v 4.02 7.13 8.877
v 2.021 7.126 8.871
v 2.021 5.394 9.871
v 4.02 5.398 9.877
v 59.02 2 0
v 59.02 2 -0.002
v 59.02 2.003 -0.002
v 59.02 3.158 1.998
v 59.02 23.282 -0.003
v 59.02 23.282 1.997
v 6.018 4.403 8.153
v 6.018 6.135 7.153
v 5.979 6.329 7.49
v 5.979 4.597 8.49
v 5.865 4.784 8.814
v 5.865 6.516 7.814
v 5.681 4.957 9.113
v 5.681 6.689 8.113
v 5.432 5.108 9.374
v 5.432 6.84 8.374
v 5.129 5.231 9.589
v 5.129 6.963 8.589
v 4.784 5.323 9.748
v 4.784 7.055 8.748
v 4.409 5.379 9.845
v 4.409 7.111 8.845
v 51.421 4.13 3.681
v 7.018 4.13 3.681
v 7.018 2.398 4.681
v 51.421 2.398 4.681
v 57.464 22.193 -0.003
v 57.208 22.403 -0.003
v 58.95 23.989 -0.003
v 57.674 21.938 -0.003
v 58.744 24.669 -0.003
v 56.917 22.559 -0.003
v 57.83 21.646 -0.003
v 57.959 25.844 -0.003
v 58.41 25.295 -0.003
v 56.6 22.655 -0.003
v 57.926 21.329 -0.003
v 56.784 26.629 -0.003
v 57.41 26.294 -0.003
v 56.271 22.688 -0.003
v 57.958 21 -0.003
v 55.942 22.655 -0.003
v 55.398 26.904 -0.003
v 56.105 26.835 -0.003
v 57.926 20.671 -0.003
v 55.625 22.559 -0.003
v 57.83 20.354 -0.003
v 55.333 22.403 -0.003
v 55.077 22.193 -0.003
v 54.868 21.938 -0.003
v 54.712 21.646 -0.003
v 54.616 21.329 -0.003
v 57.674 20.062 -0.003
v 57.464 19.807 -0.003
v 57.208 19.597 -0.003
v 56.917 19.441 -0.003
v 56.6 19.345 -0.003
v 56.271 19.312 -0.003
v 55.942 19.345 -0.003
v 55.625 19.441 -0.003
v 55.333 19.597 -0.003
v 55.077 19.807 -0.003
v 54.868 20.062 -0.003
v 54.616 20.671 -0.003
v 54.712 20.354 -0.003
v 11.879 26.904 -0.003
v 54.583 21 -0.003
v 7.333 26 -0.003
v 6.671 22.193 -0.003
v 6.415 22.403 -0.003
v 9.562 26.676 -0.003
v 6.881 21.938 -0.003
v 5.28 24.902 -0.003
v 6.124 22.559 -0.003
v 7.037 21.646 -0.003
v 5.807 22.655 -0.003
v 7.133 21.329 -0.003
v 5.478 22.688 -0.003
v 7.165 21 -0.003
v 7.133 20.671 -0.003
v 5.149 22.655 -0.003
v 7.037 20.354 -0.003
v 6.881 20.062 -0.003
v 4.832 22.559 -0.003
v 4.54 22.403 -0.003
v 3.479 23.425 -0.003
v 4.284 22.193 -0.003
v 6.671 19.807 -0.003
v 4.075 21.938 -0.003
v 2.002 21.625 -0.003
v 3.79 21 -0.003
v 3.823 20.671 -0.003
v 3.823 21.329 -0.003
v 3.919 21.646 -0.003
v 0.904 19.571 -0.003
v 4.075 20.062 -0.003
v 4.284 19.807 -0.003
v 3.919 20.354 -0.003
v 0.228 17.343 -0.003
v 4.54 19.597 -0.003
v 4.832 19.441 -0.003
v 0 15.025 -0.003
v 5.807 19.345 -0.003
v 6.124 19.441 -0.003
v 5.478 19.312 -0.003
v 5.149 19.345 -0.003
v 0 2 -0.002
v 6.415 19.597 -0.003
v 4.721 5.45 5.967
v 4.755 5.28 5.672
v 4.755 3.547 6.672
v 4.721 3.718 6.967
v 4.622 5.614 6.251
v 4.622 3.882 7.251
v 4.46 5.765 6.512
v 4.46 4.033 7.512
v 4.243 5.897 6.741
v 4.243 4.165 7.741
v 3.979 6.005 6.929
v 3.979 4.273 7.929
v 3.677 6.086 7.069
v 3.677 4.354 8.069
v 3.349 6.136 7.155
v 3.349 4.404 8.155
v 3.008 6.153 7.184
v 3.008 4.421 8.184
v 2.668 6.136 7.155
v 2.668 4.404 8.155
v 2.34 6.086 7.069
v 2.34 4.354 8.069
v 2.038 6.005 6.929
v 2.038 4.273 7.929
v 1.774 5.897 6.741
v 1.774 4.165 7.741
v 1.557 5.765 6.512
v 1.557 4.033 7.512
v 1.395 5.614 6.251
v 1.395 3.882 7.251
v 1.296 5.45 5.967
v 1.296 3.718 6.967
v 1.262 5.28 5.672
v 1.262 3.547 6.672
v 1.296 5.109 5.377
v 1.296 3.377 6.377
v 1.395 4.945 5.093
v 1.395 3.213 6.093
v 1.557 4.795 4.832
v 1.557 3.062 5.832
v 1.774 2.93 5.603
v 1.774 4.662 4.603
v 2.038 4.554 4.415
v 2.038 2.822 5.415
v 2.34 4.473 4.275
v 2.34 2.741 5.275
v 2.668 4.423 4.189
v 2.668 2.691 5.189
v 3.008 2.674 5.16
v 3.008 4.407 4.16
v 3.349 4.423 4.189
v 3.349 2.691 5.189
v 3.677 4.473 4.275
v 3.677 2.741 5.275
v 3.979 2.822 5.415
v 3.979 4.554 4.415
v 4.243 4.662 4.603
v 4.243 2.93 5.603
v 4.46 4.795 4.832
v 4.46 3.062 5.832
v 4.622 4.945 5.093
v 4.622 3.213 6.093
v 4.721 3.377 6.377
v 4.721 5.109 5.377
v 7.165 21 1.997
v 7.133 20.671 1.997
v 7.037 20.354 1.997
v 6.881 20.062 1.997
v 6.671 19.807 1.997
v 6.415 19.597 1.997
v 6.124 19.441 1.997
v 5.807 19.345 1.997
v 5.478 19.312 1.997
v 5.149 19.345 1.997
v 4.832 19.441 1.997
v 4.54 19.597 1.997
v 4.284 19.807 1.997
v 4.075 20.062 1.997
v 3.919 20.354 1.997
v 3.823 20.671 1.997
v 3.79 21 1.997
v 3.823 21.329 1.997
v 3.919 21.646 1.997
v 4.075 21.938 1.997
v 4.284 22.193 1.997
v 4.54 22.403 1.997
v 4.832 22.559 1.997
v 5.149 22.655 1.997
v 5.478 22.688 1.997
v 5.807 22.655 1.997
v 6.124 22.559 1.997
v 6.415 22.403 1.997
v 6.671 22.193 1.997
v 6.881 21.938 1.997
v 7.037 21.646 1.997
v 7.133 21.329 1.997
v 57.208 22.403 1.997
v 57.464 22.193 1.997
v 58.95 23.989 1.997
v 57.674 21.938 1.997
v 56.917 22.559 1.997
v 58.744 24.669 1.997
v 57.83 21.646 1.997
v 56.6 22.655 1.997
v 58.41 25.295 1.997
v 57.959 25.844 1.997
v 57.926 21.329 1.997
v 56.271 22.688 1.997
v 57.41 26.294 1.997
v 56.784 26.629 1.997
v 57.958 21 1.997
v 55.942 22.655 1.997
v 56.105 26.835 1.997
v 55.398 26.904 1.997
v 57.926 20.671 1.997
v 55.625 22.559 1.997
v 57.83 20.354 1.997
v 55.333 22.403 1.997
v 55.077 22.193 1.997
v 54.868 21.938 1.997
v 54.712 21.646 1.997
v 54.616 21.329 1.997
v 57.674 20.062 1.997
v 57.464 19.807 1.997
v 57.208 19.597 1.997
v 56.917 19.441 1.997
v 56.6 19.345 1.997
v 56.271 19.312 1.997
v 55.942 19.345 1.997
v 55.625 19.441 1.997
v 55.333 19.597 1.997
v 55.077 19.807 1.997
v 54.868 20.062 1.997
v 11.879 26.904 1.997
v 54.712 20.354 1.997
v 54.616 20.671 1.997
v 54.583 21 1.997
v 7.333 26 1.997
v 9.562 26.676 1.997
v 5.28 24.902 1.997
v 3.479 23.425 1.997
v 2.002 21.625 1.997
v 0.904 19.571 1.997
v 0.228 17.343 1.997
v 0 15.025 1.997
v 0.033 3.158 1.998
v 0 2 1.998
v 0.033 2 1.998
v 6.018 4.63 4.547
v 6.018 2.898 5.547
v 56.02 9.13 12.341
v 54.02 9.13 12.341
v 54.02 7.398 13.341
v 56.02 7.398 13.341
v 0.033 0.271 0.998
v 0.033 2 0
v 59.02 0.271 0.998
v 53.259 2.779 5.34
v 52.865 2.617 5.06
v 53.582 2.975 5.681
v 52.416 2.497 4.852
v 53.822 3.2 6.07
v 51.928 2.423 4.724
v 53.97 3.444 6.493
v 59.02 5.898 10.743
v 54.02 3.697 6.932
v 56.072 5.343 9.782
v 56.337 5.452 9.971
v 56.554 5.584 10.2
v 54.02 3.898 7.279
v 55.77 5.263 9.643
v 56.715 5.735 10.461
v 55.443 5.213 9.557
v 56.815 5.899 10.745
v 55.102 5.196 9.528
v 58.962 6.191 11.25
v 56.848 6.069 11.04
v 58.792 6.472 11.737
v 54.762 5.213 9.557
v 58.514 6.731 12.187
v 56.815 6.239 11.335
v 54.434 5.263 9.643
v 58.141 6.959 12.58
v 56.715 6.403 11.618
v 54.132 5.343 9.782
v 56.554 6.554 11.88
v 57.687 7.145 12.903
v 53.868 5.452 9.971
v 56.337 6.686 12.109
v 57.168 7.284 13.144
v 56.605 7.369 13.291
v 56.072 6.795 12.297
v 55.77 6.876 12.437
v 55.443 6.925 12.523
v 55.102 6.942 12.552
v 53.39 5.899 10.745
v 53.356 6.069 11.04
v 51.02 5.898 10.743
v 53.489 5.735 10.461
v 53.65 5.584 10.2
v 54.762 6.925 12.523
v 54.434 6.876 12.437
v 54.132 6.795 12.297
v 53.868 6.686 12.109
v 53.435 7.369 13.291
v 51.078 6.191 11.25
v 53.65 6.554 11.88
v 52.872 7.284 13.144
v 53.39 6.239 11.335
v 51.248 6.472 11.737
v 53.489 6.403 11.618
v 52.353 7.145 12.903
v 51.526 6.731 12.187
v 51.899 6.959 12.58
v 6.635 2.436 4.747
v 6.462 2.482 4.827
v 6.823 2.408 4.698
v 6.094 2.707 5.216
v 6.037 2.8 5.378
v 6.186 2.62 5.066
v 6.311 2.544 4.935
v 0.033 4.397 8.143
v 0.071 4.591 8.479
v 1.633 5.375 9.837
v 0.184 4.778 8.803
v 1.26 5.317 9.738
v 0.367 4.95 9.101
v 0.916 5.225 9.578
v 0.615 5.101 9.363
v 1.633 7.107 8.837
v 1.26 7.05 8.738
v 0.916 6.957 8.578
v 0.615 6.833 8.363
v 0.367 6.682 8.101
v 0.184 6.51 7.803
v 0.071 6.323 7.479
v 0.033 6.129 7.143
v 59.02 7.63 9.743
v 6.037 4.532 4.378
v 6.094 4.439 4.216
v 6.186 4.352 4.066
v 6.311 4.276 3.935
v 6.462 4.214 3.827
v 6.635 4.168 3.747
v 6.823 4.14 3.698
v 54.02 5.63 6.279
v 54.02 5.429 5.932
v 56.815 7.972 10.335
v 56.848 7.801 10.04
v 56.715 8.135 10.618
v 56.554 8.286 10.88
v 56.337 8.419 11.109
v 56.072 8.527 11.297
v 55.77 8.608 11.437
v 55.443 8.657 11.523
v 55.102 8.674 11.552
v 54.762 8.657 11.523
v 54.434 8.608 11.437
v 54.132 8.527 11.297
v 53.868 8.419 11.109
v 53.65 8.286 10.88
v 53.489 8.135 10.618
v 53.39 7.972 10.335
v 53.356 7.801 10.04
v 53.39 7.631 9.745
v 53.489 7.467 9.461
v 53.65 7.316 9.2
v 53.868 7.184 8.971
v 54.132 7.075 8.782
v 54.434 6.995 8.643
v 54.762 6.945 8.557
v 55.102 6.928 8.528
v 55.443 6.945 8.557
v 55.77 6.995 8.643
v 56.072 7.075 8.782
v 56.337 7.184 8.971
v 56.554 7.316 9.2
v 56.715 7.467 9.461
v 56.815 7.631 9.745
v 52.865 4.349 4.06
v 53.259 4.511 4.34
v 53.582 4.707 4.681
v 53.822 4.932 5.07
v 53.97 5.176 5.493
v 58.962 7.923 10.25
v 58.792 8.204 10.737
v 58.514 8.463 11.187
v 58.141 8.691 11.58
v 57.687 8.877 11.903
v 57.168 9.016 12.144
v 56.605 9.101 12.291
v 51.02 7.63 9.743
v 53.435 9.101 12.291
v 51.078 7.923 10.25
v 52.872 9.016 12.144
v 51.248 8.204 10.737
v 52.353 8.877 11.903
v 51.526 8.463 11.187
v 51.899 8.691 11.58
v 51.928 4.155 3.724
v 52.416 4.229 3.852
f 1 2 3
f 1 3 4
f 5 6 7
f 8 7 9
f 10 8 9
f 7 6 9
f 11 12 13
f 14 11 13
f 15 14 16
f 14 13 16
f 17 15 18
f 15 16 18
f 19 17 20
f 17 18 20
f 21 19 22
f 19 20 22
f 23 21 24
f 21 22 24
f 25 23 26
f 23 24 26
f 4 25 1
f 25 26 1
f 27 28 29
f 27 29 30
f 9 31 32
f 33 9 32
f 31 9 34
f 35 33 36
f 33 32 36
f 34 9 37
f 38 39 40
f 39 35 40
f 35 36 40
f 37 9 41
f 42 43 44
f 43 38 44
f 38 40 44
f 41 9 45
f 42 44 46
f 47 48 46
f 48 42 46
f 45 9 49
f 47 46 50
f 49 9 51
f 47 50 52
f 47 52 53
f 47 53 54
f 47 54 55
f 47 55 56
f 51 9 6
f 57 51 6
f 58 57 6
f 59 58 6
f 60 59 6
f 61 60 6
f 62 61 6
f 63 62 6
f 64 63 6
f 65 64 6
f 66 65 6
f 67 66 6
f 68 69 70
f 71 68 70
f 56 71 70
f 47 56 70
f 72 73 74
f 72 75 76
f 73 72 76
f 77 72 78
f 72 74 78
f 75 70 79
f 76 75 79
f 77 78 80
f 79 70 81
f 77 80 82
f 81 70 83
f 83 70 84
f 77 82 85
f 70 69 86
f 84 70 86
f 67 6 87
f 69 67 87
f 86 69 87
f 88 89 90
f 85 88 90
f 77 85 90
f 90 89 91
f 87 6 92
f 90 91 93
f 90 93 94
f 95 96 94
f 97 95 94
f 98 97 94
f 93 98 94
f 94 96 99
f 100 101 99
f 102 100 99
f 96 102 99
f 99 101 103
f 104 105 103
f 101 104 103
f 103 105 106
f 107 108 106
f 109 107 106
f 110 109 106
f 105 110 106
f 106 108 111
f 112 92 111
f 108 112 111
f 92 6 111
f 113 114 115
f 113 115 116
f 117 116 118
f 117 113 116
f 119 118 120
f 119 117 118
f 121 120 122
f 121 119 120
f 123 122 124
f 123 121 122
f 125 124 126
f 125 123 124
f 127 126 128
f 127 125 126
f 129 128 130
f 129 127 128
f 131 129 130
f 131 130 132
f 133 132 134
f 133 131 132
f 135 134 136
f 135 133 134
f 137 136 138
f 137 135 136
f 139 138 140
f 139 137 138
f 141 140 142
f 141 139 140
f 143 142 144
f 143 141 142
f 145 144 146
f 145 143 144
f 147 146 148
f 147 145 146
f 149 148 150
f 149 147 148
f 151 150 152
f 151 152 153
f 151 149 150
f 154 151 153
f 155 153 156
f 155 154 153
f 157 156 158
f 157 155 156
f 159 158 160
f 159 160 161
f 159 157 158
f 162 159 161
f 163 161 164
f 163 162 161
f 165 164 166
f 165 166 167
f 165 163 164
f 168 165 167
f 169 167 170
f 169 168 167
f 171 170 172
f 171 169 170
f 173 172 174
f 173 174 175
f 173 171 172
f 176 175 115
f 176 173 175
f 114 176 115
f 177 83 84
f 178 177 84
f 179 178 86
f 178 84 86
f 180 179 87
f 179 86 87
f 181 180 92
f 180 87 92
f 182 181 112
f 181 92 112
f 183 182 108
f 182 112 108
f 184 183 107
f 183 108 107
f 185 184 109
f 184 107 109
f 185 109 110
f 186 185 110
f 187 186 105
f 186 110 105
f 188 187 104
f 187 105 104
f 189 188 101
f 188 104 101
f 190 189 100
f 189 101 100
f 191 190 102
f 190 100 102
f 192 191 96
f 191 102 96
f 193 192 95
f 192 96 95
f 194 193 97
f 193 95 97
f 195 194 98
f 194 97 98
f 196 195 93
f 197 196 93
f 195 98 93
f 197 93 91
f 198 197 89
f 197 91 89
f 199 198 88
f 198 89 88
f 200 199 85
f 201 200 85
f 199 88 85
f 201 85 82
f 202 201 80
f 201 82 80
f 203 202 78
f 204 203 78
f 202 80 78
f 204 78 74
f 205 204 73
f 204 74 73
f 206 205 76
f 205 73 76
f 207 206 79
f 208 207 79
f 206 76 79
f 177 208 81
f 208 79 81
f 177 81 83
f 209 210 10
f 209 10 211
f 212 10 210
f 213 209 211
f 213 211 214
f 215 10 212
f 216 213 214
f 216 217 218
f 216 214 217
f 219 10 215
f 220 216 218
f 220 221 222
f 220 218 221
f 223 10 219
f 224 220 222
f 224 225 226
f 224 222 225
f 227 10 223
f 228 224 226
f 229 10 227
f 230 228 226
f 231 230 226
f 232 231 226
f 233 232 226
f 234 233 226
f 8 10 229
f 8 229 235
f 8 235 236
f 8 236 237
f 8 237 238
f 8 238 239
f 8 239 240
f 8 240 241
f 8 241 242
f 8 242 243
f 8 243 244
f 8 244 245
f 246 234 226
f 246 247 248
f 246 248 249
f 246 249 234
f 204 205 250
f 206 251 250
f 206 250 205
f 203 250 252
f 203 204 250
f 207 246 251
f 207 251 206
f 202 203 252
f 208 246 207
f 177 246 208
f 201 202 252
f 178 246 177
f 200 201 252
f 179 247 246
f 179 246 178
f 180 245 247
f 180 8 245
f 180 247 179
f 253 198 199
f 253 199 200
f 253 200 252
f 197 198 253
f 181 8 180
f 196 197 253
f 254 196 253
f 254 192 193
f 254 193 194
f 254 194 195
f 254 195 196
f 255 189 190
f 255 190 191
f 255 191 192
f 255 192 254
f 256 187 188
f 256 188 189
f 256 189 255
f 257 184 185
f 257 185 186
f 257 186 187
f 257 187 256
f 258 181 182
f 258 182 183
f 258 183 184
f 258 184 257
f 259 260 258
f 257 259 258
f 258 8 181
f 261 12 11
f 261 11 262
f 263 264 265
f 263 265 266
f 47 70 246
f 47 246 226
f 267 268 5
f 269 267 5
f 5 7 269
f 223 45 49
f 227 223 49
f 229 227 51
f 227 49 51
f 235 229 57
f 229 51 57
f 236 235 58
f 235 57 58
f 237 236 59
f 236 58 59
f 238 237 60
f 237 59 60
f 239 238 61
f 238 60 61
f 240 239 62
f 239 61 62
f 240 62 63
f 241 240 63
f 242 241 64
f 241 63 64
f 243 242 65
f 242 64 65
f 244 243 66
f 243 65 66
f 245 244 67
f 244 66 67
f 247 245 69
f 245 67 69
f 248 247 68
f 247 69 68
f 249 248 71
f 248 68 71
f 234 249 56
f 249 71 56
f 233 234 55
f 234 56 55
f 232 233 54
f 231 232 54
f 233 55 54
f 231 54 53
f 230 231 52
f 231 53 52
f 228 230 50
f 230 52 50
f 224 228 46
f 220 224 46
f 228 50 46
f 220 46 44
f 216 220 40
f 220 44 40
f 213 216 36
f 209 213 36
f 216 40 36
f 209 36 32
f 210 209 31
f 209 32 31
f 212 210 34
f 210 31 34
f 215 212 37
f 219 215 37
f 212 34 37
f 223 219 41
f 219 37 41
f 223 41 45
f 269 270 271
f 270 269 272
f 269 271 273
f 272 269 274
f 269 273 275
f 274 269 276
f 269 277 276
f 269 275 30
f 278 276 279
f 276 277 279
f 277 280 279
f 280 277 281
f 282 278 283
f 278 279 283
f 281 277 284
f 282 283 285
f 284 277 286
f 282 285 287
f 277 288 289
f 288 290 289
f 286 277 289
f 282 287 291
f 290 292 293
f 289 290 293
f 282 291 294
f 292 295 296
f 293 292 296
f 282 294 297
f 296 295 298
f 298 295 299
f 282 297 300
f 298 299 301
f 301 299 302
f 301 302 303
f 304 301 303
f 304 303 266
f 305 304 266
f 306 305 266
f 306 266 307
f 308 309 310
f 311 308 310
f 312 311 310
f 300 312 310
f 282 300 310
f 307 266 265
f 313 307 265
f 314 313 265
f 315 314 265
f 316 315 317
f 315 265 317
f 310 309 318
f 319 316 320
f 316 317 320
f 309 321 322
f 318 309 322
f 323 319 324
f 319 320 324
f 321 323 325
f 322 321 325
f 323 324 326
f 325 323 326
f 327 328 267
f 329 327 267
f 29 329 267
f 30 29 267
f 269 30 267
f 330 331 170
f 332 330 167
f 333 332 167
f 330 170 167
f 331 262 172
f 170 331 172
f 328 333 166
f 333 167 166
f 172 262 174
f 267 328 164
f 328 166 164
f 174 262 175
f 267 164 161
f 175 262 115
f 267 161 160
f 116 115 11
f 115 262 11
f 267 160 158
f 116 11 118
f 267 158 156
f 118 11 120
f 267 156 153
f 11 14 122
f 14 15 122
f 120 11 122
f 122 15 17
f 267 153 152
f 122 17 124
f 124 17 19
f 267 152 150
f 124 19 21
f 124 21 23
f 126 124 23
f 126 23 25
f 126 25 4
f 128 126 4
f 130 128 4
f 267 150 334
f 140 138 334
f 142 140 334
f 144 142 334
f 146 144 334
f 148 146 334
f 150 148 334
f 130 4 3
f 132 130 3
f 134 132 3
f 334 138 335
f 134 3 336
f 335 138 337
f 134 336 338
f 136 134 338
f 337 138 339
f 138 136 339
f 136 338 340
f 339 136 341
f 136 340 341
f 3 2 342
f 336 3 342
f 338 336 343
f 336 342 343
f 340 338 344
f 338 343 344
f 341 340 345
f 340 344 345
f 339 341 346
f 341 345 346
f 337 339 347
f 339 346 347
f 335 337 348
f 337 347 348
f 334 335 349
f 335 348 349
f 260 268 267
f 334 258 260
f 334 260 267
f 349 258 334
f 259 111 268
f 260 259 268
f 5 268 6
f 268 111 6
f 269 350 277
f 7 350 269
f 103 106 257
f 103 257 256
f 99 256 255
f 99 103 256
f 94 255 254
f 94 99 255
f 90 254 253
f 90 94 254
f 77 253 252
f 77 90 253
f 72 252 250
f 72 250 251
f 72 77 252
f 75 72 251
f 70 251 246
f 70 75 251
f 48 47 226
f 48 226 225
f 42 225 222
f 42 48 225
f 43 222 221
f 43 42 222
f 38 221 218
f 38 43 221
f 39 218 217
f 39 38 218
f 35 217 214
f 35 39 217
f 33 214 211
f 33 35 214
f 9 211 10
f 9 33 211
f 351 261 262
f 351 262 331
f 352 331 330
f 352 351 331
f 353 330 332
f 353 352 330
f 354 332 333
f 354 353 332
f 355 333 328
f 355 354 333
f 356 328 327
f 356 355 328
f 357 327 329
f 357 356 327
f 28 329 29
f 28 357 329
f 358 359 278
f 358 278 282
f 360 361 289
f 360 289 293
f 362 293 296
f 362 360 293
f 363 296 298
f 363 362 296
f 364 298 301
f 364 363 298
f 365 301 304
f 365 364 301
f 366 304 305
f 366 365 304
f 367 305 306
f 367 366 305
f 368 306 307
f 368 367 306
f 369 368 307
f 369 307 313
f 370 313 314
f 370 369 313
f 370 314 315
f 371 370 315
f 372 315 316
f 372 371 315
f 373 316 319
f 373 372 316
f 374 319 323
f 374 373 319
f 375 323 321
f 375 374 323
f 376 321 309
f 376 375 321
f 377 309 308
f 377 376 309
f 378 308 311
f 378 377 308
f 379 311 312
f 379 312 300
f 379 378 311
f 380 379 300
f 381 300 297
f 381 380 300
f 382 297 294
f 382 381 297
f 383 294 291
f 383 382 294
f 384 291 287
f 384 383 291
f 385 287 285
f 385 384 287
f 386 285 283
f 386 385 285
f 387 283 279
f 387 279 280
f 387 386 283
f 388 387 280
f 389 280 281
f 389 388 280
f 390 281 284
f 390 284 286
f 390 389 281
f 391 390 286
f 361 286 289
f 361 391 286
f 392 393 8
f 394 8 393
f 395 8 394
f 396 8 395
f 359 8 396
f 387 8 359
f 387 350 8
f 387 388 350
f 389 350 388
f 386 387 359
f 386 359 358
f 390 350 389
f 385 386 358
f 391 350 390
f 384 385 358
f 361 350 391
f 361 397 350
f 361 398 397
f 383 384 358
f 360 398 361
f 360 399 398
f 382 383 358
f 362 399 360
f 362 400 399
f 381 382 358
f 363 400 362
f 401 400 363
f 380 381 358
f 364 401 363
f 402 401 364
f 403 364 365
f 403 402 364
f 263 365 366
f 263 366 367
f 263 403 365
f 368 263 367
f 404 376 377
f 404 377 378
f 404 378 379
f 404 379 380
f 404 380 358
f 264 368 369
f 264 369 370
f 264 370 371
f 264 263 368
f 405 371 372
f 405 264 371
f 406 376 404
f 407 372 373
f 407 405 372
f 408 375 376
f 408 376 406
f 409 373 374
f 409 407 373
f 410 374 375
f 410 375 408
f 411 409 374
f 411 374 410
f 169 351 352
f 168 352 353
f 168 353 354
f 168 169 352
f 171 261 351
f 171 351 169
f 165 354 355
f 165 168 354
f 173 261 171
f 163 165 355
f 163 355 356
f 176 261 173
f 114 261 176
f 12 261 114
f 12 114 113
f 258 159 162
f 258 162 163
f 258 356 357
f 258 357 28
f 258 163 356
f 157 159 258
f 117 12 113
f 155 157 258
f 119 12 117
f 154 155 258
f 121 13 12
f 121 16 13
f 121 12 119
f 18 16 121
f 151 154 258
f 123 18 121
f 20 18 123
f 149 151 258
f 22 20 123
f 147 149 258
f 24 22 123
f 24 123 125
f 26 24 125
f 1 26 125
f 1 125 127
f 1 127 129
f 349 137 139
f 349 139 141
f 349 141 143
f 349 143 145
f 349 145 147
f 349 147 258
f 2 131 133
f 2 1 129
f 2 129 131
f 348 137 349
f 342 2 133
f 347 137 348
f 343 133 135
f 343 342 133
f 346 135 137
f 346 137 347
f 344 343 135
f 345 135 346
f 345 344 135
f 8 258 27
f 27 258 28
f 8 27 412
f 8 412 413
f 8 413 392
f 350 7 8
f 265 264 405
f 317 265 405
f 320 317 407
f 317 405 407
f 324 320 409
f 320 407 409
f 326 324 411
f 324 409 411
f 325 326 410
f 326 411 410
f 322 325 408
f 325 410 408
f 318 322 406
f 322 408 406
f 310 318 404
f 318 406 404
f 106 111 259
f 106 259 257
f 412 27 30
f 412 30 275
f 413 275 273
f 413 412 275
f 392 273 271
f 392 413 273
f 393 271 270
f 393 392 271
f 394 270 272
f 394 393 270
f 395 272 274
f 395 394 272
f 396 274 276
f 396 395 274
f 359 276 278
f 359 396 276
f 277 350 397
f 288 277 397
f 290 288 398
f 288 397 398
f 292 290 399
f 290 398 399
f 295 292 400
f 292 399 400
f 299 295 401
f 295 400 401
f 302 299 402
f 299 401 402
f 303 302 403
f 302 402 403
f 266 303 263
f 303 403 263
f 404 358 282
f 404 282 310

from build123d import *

# Parameters (mm, degrees)
SKETCH004_R          = 1.687519
PAD003_DEPTH         = 2
SKETCH003_R          = 1.746092
PAD002_DEPTH         = 2
FUSION001_ROLL_ANGLE = 90


with BuildPart() as base_and_horizontal_holder001:
    # Sketch004 → Pad003 (new body)
    with BuildSketch(Plane.XZ.offset(1.2525)):
        with BuildLine():
            Line((10.979984, 0), (69.999984, 0))
            Line((69.999984, 0), (69.999984, -21.282469))
            ThreePointArc((66.378106, -24.904346), (68.939161, -23.843523), (69.999984, -21.282469))
            Line((22.859289, -24.904346), (66.378106, -24.904346))
            ThreePointArc((10.979984, -13.025041), (14.459352, -21.424978), (22.859289, -24.904346))
            Line((10.979984, 0), (10.979984, -13.025041))
        make_face()
        with Locations((67.250754, -19)):
            Circle(SKETCH004_R, mode=Mode.SUBTRACT)
        with Locations((16.457754, -19)):
            Circle(SKETCH004_R, mode=Mode.SUBTRACT)
    extrude(amount=-PAD003_DEPTH)


with BuildPart() as icezum_30_degrees_stand_holder:
    # Sketch003 → Pad002 (new body)
    with BuildSketch(Plane(origin=(0, -0.167, -0.63), x_dir=(1, 0, 0), z_dir=(0, 0.5, 0.866025))):
        with BuildLine():
            Line((11.012519, -1.25328), (11.012519, 6.997142))
            ThreePointArc((13.001287, 8.992943), (11.59459, 8.405902), (11.012519, 6.997142))
            Line((13.001287, 8.992943), (15, 9))
            ThreePointArc((16.997615, 7.009425), (16.412099, 8.419465), (15, 9))
            Line((16.997615, 7.009425), (16.997615, 4))
            ThreePointArc((16.997615, 4), (17.290509, 3.292893), (17.997615, 3))
            Line((17.997615, 3), (62, 3))
            Line((62, 3), (62.401287, 3))
            ThreePointArc((62.401287, 3), (64.238855, 3.761145), (65, 5.598713))
            Line((65, 5.598713), (65, 6))
            Line((65, 6), (62, 10))
            ThreePointArc((65, 13), (62.87868, 12.12132), (62, 10))
            Line((65, 13), (67, 13))
            ThreePointArc((70, 10), (69.12132, 12.12132), (67, 13))
            Line((70, 10), (70, -1.25328))
            Line((11.012519, -1.25328), (70, -1.25328))
        make_face()
        with Locations((13.988471, 5.299093)):
            Circle(SKETCH003_R, mode=Mode.SUBTRACT)
        with Locations((66.082271, 10.342403)):
            Circle(SKETCH003_R, mode=Mode.SUBTRACT)
    extrude(amount=PAD002_DEPTH)

    # Fusion001: union base_and_horizontal_holder001
    add(base_and_horizontal_holder001.part)


with BuildPart() as icezum_30_degrees_stand_holder_1:
    # Fusion001 roll: moved
    add(icezum_30_degrees_stand_holder.part.rotate(Axis((0, 0, 0), (1, 0, 0)), FUSION001_ROLL_ANGLE))


with BuildPart() as icezum_30_degrees_stand_holder_2:
    # Fusion001 placement: moved
    add(icezum_30_degrees_stand_holder_1.part.moved(Location((-10.98, 2, 1.25))))


solid = icezum_30_degrees_stand_holder_2.part
